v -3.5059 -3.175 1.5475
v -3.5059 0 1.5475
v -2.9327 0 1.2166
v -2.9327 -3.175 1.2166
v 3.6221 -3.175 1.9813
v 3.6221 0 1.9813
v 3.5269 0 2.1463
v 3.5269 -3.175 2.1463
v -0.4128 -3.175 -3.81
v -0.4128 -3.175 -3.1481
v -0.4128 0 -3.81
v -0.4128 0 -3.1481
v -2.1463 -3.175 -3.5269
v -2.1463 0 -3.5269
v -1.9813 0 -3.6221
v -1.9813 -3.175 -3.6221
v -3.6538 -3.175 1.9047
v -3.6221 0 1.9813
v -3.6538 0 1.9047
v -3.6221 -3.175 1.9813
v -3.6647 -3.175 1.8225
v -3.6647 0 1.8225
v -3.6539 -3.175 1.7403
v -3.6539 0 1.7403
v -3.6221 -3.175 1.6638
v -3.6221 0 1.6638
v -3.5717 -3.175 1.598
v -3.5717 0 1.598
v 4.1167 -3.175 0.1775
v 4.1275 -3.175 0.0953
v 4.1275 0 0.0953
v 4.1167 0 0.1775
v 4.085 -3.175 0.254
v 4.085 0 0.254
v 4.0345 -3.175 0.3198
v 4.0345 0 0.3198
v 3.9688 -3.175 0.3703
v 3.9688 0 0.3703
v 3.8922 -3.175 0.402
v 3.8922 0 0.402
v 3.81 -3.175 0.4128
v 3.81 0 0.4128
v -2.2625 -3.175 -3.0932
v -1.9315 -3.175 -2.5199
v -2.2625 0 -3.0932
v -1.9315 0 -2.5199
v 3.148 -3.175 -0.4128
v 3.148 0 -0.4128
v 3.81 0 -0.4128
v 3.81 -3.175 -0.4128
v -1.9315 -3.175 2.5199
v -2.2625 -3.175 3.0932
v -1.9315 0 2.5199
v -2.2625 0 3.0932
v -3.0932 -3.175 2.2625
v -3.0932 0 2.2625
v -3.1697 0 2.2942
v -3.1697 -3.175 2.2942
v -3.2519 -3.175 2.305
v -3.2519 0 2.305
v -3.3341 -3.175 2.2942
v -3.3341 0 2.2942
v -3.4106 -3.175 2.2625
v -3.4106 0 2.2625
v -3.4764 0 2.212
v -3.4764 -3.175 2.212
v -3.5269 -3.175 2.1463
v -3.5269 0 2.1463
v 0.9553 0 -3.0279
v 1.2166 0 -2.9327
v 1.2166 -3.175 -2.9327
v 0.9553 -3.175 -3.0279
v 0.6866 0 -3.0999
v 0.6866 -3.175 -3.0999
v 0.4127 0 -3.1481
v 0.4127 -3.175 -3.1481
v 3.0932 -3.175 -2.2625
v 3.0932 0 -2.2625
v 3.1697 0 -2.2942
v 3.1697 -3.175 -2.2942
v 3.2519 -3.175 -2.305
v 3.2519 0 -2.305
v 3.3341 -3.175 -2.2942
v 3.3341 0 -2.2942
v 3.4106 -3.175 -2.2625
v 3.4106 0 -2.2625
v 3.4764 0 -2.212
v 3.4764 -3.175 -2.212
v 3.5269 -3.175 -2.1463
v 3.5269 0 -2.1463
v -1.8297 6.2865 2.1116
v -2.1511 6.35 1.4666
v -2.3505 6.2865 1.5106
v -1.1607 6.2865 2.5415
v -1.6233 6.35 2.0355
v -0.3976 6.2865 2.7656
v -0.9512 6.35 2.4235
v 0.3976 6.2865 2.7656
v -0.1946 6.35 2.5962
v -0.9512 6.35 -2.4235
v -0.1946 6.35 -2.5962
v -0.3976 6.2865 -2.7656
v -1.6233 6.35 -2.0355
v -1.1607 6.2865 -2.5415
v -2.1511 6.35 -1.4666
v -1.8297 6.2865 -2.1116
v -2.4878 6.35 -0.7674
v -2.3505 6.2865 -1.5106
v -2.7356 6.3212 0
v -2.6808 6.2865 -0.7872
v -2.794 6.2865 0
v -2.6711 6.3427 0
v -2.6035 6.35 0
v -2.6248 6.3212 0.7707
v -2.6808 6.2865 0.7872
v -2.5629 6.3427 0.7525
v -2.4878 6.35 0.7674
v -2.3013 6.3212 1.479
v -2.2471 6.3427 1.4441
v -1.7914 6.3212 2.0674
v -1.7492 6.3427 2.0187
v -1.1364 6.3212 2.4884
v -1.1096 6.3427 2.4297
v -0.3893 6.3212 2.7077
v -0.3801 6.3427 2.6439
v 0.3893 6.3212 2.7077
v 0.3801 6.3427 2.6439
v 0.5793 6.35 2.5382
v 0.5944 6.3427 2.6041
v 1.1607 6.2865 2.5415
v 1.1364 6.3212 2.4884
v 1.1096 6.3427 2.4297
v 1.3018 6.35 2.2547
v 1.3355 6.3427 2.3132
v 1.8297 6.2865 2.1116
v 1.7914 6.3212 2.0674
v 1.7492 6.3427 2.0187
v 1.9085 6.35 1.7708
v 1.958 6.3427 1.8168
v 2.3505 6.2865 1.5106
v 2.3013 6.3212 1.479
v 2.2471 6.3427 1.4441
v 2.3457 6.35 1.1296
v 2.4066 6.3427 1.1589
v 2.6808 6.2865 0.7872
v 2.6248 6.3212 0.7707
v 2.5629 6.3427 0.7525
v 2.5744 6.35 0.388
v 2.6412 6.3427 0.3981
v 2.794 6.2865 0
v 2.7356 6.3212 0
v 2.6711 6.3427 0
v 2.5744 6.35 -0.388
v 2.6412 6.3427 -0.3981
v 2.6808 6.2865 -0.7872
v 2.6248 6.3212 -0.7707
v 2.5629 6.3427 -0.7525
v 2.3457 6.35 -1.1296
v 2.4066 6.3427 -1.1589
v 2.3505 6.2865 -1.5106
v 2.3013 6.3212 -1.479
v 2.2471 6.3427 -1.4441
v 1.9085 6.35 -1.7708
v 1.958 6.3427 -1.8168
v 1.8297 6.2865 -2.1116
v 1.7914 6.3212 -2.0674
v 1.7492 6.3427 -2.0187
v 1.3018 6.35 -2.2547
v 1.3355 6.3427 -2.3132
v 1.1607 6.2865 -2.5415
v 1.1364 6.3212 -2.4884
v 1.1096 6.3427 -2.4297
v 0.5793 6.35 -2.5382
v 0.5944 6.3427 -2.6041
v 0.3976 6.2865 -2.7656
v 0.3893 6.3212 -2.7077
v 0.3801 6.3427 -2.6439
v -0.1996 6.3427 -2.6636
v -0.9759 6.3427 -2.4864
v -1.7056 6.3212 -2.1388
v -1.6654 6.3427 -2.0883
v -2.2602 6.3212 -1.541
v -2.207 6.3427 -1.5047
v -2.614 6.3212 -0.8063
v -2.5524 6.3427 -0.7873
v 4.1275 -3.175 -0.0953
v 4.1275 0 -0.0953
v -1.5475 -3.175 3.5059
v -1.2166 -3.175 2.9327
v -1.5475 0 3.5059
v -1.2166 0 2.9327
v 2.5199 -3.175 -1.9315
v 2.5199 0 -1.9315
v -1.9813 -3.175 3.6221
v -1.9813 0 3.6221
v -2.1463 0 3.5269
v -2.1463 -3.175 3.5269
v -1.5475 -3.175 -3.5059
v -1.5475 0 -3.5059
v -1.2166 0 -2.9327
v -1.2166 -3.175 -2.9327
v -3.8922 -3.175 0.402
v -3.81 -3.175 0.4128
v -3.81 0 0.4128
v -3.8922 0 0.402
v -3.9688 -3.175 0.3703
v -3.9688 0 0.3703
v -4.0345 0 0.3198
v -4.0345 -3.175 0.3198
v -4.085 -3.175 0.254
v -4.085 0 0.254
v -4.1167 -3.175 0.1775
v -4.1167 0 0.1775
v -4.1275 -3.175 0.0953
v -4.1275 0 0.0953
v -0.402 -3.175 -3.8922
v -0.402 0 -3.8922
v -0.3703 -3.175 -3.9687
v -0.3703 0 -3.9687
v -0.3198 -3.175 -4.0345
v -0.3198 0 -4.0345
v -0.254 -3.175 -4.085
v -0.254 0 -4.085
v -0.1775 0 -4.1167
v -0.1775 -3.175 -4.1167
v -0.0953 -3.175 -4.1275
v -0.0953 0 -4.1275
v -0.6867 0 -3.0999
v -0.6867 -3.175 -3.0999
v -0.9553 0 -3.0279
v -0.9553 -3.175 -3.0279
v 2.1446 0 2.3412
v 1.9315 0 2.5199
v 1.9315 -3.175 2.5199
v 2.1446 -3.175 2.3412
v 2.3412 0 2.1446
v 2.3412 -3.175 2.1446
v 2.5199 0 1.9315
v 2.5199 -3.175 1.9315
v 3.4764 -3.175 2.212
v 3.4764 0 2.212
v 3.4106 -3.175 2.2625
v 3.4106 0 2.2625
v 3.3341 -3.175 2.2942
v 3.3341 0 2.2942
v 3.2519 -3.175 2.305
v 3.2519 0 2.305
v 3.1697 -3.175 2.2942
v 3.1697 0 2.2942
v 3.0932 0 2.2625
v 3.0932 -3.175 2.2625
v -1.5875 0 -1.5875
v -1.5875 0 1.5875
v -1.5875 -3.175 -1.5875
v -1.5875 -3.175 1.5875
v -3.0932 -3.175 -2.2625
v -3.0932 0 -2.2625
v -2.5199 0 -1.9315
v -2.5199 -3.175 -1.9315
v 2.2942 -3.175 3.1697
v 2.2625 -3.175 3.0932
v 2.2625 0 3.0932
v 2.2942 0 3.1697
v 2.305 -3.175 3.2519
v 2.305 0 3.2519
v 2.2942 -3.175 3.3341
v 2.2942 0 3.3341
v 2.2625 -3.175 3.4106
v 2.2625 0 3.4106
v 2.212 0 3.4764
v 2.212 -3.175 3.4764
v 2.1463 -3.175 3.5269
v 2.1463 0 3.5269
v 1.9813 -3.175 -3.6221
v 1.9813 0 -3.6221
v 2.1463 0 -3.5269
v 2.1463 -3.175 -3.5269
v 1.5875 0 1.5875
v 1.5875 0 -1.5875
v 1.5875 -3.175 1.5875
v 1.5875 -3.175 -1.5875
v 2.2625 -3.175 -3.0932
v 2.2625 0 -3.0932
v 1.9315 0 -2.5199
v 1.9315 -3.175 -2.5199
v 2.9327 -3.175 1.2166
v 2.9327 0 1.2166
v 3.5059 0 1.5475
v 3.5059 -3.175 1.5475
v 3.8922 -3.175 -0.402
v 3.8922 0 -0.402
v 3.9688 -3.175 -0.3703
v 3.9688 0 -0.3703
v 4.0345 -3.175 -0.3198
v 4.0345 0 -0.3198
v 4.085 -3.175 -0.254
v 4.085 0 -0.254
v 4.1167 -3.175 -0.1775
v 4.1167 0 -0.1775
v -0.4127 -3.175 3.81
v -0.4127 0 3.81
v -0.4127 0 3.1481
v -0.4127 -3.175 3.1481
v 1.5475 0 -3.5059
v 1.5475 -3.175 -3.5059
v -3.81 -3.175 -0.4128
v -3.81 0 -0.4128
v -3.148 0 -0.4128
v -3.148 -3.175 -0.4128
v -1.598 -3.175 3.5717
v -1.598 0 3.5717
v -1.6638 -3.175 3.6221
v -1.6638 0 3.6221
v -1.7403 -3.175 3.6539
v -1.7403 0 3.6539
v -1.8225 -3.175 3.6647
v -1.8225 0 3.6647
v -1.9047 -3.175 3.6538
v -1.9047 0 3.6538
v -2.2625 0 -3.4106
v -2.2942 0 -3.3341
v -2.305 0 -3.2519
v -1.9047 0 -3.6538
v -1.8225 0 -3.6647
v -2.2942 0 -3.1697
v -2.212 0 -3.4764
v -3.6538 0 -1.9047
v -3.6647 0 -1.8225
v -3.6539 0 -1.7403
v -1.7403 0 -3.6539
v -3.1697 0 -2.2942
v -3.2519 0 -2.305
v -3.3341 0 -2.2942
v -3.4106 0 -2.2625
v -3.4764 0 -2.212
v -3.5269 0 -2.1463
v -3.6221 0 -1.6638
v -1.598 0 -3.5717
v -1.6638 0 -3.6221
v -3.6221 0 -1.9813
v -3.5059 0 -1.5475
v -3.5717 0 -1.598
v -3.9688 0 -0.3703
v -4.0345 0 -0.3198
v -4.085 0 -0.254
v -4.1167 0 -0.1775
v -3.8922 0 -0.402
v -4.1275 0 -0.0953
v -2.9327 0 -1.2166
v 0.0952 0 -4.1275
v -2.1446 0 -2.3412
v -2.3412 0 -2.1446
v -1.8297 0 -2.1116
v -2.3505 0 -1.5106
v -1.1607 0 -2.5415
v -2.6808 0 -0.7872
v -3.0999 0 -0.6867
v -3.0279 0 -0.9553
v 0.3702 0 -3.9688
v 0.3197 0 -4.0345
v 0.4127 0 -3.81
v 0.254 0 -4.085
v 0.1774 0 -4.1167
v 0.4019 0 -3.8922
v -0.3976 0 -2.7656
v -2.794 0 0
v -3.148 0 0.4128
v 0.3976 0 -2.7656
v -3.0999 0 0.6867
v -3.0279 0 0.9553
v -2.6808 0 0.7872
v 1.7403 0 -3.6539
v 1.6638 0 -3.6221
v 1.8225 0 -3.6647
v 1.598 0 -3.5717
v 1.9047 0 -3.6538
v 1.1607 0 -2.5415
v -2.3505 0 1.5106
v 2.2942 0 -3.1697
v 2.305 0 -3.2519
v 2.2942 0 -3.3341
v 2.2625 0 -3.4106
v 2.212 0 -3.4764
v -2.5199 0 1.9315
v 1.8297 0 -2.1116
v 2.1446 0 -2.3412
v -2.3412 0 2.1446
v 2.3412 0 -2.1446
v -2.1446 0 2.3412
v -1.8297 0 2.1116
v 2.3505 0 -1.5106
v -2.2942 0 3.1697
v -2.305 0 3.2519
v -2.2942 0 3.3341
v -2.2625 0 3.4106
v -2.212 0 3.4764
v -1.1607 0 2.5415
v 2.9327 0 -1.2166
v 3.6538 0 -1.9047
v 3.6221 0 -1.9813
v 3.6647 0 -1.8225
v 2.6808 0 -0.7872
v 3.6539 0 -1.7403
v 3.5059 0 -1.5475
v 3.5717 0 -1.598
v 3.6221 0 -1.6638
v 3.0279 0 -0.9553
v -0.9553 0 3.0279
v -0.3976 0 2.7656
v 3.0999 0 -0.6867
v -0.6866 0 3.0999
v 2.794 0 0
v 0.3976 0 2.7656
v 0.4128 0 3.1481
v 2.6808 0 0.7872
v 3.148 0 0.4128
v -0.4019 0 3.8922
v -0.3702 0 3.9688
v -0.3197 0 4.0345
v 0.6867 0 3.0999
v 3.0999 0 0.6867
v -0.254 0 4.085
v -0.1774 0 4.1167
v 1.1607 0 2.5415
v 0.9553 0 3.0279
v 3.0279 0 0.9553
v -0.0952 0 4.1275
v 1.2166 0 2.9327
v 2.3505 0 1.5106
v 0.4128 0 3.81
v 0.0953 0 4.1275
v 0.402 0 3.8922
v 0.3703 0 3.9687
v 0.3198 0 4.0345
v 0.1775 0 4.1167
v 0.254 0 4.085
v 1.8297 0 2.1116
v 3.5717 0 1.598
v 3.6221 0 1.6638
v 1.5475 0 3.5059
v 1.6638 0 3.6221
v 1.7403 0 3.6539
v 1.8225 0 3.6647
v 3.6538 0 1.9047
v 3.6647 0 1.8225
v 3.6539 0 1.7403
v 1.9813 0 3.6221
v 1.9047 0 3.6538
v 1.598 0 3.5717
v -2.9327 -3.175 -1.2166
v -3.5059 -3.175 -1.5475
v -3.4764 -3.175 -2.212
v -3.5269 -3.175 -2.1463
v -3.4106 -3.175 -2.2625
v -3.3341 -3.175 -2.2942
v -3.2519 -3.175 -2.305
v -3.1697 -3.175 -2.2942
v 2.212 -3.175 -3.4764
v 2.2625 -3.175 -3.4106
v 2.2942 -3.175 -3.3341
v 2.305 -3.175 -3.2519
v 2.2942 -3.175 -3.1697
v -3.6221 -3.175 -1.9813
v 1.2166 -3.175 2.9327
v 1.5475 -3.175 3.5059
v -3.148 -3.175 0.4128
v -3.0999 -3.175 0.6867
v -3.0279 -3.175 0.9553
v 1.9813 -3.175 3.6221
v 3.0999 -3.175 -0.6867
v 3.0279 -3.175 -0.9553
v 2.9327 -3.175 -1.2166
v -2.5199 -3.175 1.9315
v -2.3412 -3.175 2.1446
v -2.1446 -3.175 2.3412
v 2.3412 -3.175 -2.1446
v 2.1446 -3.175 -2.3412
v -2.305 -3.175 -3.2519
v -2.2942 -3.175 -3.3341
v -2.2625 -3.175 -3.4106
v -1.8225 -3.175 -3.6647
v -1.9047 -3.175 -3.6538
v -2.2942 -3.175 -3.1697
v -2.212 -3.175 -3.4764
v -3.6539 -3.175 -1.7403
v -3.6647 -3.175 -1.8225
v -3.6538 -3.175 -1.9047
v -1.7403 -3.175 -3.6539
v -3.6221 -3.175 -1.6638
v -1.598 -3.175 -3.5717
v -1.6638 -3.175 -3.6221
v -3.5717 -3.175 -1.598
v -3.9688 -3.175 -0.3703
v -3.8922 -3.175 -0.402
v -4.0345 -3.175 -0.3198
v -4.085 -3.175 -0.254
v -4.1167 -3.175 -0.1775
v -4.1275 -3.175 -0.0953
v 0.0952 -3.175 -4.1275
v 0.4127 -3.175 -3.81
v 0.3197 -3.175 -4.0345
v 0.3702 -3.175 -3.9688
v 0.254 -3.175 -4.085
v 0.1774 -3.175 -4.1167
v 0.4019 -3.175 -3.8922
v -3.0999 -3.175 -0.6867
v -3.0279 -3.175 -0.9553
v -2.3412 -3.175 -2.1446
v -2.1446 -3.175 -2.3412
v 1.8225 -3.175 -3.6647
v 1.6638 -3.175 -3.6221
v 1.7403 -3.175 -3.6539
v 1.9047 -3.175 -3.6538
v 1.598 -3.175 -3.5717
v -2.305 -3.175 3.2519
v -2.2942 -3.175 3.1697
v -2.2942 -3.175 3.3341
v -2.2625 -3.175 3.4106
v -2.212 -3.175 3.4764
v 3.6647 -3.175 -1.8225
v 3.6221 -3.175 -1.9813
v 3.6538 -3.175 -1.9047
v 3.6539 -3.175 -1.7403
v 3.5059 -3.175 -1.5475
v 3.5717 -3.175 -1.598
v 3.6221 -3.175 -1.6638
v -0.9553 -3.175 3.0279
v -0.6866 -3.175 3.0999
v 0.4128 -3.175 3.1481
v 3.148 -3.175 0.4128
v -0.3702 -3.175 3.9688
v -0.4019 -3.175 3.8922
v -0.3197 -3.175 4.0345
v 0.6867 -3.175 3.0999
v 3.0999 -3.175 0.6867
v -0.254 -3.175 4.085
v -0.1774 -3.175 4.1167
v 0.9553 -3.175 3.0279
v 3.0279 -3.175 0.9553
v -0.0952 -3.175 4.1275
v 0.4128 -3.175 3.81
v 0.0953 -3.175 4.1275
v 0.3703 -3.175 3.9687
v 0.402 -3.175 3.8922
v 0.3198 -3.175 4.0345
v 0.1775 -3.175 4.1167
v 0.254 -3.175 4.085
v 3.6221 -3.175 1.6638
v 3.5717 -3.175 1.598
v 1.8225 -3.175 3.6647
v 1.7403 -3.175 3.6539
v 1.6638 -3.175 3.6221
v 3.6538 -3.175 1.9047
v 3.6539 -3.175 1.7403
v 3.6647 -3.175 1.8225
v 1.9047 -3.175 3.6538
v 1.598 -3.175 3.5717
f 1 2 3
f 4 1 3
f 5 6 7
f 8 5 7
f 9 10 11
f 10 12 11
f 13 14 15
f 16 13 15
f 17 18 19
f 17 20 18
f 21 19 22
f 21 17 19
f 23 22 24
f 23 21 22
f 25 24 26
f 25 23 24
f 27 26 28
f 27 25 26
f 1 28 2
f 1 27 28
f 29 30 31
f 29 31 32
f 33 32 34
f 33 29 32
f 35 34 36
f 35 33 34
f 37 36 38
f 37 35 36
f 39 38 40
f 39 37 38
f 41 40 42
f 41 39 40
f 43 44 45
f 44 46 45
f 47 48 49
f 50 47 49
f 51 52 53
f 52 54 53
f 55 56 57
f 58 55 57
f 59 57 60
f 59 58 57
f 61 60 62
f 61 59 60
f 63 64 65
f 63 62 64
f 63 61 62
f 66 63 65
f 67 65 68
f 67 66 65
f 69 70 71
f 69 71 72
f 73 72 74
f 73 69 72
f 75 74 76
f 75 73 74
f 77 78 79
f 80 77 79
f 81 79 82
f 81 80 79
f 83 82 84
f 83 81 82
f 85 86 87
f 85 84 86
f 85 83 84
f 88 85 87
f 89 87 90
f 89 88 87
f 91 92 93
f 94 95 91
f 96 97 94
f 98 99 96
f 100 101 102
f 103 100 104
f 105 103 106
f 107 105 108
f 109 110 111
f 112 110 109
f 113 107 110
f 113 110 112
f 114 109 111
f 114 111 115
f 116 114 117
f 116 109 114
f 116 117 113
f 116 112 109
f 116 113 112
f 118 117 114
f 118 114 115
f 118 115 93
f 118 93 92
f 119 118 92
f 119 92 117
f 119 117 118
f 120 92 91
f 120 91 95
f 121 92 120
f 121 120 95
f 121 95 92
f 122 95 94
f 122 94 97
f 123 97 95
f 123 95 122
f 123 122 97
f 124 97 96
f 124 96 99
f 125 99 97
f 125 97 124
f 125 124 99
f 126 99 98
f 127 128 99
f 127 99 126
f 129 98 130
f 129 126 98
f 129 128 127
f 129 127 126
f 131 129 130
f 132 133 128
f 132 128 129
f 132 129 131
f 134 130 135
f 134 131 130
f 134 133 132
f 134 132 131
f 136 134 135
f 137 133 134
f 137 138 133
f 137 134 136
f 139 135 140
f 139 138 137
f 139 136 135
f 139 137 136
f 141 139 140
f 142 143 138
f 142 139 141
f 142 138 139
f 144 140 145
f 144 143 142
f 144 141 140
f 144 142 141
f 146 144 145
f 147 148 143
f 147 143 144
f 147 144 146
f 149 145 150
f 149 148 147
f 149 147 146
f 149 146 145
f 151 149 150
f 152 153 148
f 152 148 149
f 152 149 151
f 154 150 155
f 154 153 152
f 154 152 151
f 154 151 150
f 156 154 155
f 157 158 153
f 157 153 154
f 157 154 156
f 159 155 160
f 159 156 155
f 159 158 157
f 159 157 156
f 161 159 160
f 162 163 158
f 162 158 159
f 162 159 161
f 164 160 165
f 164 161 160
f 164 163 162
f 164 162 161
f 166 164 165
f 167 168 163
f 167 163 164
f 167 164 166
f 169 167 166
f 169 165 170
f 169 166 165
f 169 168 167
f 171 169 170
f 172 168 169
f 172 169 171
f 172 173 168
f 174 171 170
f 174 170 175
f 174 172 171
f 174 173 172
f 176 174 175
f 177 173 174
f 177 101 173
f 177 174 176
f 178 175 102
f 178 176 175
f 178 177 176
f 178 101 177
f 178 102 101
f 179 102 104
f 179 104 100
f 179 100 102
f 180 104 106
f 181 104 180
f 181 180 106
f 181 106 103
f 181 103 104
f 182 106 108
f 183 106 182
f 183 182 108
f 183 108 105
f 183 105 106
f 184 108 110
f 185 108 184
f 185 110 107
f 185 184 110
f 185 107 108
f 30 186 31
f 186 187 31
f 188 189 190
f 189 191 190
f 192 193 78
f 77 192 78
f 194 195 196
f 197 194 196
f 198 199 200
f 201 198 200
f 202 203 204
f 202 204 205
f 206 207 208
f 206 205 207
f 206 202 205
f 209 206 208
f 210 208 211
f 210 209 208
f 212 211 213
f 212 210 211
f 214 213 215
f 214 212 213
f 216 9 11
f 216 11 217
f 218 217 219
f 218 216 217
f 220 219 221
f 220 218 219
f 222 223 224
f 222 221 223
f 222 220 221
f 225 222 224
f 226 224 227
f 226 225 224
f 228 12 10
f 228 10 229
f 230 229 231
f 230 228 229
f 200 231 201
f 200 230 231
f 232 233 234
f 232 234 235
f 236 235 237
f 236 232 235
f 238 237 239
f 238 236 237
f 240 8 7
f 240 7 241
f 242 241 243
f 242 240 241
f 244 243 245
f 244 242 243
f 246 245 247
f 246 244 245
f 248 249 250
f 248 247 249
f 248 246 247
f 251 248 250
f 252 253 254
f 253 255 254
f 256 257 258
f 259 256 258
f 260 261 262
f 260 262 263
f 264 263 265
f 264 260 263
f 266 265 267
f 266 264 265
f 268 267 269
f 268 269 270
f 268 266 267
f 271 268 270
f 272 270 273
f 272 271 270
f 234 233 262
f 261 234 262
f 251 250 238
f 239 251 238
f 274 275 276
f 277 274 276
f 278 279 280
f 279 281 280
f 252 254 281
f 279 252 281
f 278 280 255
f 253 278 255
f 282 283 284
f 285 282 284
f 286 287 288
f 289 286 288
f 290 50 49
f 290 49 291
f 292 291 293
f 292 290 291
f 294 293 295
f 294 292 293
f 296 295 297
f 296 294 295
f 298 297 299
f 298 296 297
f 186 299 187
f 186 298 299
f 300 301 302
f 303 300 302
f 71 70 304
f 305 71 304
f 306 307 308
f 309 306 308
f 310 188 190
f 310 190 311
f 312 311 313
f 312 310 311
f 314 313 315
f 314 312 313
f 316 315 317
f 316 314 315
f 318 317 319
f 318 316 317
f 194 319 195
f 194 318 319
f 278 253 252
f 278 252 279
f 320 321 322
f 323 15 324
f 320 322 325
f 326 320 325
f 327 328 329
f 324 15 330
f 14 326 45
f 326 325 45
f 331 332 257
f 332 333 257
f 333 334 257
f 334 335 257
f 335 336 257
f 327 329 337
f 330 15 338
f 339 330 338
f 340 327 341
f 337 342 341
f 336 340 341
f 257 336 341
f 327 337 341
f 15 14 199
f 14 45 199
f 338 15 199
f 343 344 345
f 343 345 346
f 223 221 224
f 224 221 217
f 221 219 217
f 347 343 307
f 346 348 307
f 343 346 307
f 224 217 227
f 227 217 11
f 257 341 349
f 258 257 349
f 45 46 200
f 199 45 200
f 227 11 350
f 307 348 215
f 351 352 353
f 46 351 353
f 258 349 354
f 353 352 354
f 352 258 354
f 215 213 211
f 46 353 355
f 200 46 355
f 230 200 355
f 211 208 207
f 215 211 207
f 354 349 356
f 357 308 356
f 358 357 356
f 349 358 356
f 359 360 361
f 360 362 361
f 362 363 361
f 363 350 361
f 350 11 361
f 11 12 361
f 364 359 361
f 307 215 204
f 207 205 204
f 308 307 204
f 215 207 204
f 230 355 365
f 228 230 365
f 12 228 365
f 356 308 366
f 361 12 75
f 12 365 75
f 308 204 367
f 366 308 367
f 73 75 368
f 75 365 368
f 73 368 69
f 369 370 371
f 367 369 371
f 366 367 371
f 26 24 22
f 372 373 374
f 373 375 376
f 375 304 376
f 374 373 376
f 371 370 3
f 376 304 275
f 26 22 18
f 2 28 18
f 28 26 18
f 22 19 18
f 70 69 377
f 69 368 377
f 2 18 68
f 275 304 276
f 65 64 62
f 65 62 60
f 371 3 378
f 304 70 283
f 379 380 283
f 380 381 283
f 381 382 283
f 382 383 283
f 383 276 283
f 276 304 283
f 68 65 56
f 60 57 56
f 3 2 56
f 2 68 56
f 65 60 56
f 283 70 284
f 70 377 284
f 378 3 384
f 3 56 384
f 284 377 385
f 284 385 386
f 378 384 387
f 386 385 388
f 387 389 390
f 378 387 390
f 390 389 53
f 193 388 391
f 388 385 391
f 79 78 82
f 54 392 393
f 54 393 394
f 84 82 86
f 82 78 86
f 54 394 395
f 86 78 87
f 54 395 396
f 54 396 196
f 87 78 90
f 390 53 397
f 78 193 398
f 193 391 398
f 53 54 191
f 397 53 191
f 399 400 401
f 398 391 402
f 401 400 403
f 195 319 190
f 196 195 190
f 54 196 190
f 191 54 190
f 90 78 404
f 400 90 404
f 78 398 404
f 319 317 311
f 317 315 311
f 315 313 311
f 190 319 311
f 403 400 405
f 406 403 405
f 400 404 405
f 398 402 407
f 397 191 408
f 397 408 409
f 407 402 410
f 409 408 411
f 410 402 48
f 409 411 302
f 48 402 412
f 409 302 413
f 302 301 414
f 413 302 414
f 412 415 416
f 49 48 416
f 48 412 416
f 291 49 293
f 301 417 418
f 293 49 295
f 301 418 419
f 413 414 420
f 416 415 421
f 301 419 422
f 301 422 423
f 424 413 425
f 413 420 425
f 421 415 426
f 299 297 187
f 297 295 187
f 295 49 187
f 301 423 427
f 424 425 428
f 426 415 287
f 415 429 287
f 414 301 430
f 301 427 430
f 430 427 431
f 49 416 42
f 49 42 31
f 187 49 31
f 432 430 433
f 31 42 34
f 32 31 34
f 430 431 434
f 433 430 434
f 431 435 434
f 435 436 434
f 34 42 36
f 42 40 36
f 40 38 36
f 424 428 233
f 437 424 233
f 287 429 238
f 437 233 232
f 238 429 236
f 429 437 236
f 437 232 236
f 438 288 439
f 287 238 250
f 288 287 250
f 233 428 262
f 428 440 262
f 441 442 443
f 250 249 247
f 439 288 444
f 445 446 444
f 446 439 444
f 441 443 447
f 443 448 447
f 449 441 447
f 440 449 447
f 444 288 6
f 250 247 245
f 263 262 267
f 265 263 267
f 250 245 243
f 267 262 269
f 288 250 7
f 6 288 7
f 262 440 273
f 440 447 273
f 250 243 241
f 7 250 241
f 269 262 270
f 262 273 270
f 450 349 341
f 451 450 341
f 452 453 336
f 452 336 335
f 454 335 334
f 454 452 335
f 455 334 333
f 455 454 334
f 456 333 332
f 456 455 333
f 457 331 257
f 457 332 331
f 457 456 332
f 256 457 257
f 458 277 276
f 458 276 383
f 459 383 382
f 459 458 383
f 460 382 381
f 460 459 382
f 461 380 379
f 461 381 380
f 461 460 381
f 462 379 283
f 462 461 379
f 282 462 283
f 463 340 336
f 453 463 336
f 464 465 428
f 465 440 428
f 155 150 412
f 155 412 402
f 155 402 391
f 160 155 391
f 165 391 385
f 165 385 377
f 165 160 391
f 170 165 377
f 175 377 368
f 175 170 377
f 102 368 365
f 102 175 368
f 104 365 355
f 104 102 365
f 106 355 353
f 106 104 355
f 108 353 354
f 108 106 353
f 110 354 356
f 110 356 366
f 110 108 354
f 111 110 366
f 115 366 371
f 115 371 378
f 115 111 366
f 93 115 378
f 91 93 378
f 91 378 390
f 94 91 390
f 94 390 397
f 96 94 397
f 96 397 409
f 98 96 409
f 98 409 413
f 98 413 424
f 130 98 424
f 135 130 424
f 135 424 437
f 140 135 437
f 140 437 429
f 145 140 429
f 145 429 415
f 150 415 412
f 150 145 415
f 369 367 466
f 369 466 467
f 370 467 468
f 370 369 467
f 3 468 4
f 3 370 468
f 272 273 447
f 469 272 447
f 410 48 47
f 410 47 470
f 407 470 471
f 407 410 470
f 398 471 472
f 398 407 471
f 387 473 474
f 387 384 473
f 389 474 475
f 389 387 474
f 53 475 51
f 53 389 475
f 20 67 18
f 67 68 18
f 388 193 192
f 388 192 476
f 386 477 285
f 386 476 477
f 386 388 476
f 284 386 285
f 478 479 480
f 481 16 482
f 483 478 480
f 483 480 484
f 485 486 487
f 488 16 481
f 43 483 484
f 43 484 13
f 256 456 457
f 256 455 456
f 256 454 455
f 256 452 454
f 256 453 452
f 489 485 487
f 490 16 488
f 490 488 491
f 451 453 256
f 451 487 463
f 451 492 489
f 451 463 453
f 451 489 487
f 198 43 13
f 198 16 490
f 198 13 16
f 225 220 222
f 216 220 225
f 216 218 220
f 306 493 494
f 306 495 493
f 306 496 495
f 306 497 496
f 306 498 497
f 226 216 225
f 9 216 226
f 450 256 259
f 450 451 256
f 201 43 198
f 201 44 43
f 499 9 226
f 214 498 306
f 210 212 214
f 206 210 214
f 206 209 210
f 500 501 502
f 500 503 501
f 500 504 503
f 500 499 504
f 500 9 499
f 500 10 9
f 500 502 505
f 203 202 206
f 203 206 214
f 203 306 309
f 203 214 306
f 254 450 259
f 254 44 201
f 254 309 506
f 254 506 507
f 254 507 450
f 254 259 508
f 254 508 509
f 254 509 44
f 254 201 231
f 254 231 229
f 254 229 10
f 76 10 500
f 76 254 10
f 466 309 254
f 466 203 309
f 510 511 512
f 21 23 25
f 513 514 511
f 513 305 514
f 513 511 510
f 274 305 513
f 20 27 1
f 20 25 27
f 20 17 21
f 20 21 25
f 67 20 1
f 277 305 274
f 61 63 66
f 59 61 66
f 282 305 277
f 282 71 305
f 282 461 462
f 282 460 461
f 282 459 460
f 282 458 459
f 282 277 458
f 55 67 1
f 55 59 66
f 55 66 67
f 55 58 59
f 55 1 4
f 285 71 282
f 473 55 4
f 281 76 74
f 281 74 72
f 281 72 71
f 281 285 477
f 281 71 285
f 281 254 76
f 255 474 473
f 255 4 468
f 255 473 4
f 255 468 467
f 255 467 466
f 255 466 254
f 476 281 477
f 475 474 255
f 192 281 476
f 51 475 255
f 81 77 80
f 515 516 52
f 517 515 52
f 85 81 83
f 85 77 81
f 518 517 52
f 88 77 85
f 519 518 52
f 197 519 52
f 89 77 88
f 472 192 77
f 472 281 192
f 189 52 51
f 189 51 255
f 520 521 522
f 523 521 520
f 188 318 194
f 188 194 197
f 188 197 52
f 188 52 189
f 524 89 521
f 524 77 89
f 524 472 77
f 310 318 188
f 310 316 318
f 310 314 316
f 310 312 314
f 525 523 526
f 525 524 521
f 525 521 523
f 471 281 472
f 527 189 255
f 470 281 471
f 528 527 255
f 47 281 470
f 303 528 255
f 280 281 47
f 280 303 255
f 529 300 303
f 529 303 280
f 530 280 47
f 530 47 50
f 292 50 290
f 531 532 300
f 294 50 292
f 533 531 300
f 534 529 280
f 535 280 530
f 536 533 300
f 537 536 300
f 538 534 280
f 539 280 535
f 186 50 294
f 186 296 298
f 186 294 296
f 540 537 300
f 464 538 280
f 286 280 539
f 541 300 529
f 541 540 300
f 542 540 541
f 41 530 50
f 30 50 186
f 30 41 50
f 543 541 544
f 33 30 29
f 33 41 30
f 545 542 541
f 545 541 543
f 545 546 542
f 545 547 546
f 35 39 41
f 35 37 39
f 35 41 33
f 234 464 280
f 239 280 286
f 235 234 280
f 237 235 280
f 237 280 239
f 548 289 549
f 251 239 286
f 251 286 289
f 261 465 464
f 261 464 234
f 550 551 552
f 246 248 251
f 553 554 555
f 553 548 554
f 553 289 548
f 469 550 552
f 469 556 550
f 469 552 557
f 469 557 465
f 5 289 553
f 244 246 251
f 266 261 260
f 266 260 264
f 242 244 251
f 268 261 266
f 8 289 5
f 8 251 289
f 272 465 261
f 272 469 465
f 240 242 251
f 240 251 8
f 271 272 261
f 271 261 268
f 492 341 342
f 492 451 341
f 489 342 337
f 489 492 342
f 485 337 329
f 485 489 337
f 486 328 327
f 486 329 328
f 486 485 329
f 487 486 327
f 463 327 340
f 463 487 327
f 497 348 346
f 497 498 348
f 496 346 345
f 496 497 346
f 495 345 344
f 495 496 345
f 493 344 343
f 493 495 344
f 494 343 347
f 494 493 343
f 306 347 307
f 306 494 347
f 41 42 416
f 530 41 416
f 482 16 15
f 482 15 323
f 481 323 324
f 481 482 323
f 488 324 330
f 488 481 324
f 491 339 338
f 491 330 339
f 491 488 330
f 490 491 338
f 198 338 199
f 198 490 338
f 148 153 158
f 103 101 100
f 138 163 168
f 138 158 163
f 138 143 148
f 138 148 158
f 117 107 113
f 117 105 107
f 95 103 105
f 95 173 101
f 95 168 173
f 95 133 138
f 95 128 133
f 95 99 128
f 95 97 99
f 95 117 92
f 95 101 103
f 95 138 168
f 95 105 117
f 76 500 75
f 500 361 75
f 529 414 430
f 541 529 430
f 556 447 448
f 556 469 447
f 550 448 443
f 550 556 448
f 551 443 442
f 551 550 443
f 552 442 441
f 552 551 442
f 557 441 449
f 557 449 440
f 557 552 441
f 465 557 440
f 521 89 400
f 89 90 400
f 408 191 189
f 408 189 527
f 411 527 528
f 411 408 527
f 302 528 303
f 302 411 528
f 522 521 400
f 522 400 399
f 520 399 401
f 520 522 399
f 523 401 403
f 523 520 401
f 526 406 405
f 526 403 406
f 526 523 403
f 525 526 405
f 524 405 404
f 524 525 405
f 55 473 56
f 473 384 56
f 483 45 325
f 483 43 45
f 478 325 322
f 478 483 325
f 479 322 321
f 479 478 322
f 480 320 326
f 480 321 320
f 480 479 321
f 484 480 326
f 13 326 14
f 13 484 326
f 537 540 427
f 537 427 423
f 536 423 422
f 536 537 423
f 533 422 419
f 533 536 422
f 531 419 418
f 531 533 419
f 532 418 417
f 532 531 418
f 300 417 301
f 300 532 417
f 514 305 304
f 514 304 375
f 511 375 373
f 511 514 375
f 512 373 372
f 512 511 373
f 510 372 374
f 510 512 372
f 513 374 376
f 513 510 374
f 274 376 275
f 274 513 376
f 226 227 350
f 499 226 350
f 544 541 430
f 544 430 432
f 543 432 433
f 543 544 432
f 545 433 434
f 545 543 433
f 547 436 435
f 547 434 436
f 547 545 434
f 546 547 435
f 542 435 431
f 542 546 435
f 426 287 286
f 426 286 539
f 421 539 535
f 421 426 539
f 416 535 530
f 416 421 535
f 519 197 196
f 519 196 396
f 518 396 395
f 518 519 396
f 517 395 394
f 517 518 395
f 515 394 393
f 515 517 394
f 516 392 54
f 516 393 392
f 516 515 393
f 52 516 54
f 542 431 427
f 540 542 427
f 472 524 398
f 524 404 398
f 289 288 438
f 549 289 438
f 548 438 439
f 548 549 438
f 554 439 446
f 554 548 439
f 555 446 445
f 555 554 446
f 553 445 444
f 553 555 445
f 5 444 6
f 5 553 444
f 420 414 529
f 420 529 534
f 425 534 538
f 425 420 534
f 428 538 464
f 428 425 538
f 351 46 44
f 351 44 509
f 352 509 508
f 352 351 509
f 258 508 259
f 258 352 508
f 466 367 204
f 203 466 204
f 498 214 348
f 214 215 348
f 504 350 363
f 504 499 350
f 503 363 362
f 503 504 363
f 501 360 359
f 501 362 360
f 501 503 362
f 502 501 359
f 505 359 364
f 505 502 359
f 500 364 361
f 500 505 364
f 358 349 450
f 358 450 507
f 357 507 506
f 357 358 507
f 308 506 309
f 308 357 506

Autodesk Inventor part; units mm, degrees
ref_plane "YZ Plane" through (0, 0, 0) normal (1, 0, 0) x (0, 1, 0)
ref_plane "XZ Plane" through (0, 0, 0) normal (0, 1, 0) x (-1, 0, 0)
ref_plane "XY Plane" through (0, 0, 0) normal (0, 0, 1) x (1, 0, 0)
sketch "Sketch1" plane through (0, 0, 0) normal (0, 1, 0) x (-1, 0, 0)
  circle A0 centre (0, 0) radius 2.921
  dimension "d0" = 5.842
extrude "Extrusion1" add sketch "Sketch1" along normal blind 6.35
sketch "Sketch2" plane through (0, 0, 0) normal (0, -1, 0) x (1, 0, 0)
  circle A0 centre (0, 0) radius 2.921
  line L0 (-4.1275, -0.4128) -> (4.1275, -0.4128)
  line L1 (4.1275, -0.4128) -> (4.1275, 0.4128)
  line L2 (4.1275, 0.4128) -> (-4.1275, 0.4128)
  line L3 (-4.1275, 0.4128) -> (-4.1275, -0.4128)
  line L4 (-4.1275, -0.4128) -> (4.1275, 0.4128) construction
  line L5 (4.1275, -0.4128) -> (-4.1275, 0.4128) construction
  line L6 (3.7809, 1.7063) -> (3.3681, 2.4212)
  line L7 (-3.3681, -2.4212) -> (3.7809, 1.7063)
  line L8 (3.3681, 2.4212) -> (-3.7809, -1.7063)
  line L9 (-3.7809, -1.7063) -> (-3.3681, -2.4212)
  line L10 (2.4212, 3.3681) -> (1.7063, 3.7809)
  line L11 (-1.7063, -3.7809) -> (2.4212, 3.3681)
  line L12 (1.7063, 3.7809) -> (-2.4212, -3.3681)
  line L13 (-2.4212, -3.3681) -> (-1.7063, -3.7809)
  line L14 (0.4128, 4.1275) -> (-0.4127, 4.1275)
  line L15 (0.4127, -4.1275) -> (0.4128, 4.1275)
  line L16 (-0.4127, 4.1275) -> (-0.4128, -4.1275)
  line L17 (-0.4128, -4.1275) -> (0.4127, -4.1275)
  line L18 (-1.7063, 3.7809) -> (-2.4212, 3.3681)
  line L19 (2.4212, -3.3681) -> (-1.7063, 3.7809)
  line L20 (-2.4212, 3.3681) -> (1.7063, -3.7809)
  line L21 (1.7063, -3.7809) -> (2.4212, -3.3681)
  line L22 (-3.3681, 2.4212) -> (-3.7809, 1.7063)
  line L23 (3.7809, -1.7063) -> (-3.3681, 2.4212)
  line L24 (-3.7809, 1.7063) -> (3.3681, -2.4212)
  line L25 (3.3681, -2.4212) -> (3.7809, -1.7063)
  line L26 (-4.1275, 0.4128) -> (-4.1275, -0.4127)
  line L27 (4.1275, 0.4127) -> (-4.1275, 0.4128)
  line L28 (-4.1275, -0.4127) -> (4.1275, -0.4128)
  line L29 (4.1275, -0.4128) -> (4.1275, 0.4127)
  line L30 (-3.7809, -1.7063) -> (-3.3681, -2.4212)
  line L31 (3.3681, 2.4212) -> (-3.7809, -1.7063)
  line L32 (-3.3681, -2.4212) -> (3.7809, 1.7063)
  line L33 (3.7809, 1.7063) -> (3.3681, 2.4212)
  line L34 (-2.4212, -3.3681) -> (-1.7063, -3.7809)
  line L35 (1.7063, 3.7809) -> (-2.4212, -3.3681)
  line L36 (-1.7063, -3.7809) -> (2.4212, 3.3681)
  line L37 (2.4212, 3.3681) -> (1.7063, 3.7809)
  line L38 (-0.4128, -4.1275) -> (0.4127, -4.1275)
  line L39 (-0.4127, 4.1275) -> (-0.4128, -4.1275)
  line L40 (0.4127, -4.1275) -> (0.4128, 4.1275)
  line L41 (0.4128, 4.1275) -> (-0.4127, 4.1275)
  line L42 (1.7063, -3.7809) -> (2.4212, -3.3681)
  line L43 (-2.4212, 3.3681) -> (1.7063, -3.7809)
  line L44 (2.4212, -3.3681) -> (-1.7063, 3.7809)
  line L45 (-1.7063, 3.7809) -> (-2.4212, 3.3681)
  line L46 (3.3681, -2.4212) -> (3.7809, -1.7063)
  line L47 (-3.7809, 1.7063) -> (3.3681, -2.4212)
  line L48 (3.7809, -1.7063) -> (-3.3681, 2.4212)
  line L49 (-3.3681, 2.4212) -> (-3.7809, 1.7063)
  circle A1 centre (0, 0) radius 3.175
  circle A2 centre (0, 0) radius 3.175
  point P0 (2.9327, -1.2166)
  point P1 (3.1481, -0.4127)
  point P2 (3.1481, 0.4128)
  point P3 (2.9327, 1.2166)
  point P4 (2.5199, 1.9315)
  point P5 (1.9315, 2.5199)
  point P6 (1.2166, 2.9327)
  point P7 (0.4128, 3.1481)
  point P8 (-0.4128, 3.1481)
  point P9 (-1.2166, 2.9327)
  point P10 (-1.9315, 2.5199)
  point P11 (-2.5199, 1.9315)
  point P12 (-2.9327, 1.2166)
  point P13 (-3.1481, 0.4127)
  point P14 (-3.1481, -0.4128)
  point P15 (-2.9327, -1.2166)
  point P16 (-2.5199, -1.9315)
  point P17 (-1.9315, -2.5199)
  point P18 (-1.2166, -2.9327)
  point P19 (-0.4128, -3.1481)
  point P20 (0.4127, -3.1481)
  point P21 (1.2166, -2.9327)
  point P22 (1.9315, -2.5199)
  point P23 (2.5199, -1.9315)
  dimension "d5" = 8.255
  dimension "d6" = 0.8255
  dimension "d7" = 360
extrude "Extrusion2" add sketch "Sketch2" along normal blind 3.175
fillet "Fillet1" radius 0.3175 2 edges at (2.4212, -1.5875, 3.3681) (1.7063, -1.5875, 3.7809)
pattern_circular "Circular Pattern1" count 12 over 360 about axis through (0, 0, 0) along (0, 1, 0) of "Fillet1", "Extrusion1"
fillet "Fillet2" radius 0.3175 1 edges at (2.921, 6.35, 0)
sketch "Sketch3" plane through (0, -3.175, 0) normal (0, -1, 0) x (1, 0, 0)
  line L0 (-1.5875, -1.5875) -> (1.5875, -1.5875)
  line L1 (1.5875, -1.5875) -> (1.5875, 1.5875)
  line L2 (1.5875, 1.5875) -> (-1.5875, 1.5875)
  line L3 (-1.5875, 1.5875) -> (-1.5875, -1.5875)
  line L4 (-1.5875, -1.5875) -> (1.5875, 1.5875) construction
  line L5 (1.5875, -1.5875) -> (-1.5875, 1.5875) construction
  point P0 (0, 0)
  dimension "d15" = 3.175
  dimension "d16" = 3.175
extrude "Extrusion3" cut sketch "Sketch3" against normal blind 3.175
sketch "Sketch4" plane through (0, 6.35, 0) normal (0, 1, 0) x (1, 0, 0)
  circle A0 centre (0, 0) radius 2.921
  circle A1 centre (0, 0) radius 2.921 projected
  circle A2 centre (0, 0) radius 2.794
  dimension "d19" = 5.588
extrude "Extrusion4" cut sketch "Sketch4" against normal blind 6.35
properties part number "Gear1"
